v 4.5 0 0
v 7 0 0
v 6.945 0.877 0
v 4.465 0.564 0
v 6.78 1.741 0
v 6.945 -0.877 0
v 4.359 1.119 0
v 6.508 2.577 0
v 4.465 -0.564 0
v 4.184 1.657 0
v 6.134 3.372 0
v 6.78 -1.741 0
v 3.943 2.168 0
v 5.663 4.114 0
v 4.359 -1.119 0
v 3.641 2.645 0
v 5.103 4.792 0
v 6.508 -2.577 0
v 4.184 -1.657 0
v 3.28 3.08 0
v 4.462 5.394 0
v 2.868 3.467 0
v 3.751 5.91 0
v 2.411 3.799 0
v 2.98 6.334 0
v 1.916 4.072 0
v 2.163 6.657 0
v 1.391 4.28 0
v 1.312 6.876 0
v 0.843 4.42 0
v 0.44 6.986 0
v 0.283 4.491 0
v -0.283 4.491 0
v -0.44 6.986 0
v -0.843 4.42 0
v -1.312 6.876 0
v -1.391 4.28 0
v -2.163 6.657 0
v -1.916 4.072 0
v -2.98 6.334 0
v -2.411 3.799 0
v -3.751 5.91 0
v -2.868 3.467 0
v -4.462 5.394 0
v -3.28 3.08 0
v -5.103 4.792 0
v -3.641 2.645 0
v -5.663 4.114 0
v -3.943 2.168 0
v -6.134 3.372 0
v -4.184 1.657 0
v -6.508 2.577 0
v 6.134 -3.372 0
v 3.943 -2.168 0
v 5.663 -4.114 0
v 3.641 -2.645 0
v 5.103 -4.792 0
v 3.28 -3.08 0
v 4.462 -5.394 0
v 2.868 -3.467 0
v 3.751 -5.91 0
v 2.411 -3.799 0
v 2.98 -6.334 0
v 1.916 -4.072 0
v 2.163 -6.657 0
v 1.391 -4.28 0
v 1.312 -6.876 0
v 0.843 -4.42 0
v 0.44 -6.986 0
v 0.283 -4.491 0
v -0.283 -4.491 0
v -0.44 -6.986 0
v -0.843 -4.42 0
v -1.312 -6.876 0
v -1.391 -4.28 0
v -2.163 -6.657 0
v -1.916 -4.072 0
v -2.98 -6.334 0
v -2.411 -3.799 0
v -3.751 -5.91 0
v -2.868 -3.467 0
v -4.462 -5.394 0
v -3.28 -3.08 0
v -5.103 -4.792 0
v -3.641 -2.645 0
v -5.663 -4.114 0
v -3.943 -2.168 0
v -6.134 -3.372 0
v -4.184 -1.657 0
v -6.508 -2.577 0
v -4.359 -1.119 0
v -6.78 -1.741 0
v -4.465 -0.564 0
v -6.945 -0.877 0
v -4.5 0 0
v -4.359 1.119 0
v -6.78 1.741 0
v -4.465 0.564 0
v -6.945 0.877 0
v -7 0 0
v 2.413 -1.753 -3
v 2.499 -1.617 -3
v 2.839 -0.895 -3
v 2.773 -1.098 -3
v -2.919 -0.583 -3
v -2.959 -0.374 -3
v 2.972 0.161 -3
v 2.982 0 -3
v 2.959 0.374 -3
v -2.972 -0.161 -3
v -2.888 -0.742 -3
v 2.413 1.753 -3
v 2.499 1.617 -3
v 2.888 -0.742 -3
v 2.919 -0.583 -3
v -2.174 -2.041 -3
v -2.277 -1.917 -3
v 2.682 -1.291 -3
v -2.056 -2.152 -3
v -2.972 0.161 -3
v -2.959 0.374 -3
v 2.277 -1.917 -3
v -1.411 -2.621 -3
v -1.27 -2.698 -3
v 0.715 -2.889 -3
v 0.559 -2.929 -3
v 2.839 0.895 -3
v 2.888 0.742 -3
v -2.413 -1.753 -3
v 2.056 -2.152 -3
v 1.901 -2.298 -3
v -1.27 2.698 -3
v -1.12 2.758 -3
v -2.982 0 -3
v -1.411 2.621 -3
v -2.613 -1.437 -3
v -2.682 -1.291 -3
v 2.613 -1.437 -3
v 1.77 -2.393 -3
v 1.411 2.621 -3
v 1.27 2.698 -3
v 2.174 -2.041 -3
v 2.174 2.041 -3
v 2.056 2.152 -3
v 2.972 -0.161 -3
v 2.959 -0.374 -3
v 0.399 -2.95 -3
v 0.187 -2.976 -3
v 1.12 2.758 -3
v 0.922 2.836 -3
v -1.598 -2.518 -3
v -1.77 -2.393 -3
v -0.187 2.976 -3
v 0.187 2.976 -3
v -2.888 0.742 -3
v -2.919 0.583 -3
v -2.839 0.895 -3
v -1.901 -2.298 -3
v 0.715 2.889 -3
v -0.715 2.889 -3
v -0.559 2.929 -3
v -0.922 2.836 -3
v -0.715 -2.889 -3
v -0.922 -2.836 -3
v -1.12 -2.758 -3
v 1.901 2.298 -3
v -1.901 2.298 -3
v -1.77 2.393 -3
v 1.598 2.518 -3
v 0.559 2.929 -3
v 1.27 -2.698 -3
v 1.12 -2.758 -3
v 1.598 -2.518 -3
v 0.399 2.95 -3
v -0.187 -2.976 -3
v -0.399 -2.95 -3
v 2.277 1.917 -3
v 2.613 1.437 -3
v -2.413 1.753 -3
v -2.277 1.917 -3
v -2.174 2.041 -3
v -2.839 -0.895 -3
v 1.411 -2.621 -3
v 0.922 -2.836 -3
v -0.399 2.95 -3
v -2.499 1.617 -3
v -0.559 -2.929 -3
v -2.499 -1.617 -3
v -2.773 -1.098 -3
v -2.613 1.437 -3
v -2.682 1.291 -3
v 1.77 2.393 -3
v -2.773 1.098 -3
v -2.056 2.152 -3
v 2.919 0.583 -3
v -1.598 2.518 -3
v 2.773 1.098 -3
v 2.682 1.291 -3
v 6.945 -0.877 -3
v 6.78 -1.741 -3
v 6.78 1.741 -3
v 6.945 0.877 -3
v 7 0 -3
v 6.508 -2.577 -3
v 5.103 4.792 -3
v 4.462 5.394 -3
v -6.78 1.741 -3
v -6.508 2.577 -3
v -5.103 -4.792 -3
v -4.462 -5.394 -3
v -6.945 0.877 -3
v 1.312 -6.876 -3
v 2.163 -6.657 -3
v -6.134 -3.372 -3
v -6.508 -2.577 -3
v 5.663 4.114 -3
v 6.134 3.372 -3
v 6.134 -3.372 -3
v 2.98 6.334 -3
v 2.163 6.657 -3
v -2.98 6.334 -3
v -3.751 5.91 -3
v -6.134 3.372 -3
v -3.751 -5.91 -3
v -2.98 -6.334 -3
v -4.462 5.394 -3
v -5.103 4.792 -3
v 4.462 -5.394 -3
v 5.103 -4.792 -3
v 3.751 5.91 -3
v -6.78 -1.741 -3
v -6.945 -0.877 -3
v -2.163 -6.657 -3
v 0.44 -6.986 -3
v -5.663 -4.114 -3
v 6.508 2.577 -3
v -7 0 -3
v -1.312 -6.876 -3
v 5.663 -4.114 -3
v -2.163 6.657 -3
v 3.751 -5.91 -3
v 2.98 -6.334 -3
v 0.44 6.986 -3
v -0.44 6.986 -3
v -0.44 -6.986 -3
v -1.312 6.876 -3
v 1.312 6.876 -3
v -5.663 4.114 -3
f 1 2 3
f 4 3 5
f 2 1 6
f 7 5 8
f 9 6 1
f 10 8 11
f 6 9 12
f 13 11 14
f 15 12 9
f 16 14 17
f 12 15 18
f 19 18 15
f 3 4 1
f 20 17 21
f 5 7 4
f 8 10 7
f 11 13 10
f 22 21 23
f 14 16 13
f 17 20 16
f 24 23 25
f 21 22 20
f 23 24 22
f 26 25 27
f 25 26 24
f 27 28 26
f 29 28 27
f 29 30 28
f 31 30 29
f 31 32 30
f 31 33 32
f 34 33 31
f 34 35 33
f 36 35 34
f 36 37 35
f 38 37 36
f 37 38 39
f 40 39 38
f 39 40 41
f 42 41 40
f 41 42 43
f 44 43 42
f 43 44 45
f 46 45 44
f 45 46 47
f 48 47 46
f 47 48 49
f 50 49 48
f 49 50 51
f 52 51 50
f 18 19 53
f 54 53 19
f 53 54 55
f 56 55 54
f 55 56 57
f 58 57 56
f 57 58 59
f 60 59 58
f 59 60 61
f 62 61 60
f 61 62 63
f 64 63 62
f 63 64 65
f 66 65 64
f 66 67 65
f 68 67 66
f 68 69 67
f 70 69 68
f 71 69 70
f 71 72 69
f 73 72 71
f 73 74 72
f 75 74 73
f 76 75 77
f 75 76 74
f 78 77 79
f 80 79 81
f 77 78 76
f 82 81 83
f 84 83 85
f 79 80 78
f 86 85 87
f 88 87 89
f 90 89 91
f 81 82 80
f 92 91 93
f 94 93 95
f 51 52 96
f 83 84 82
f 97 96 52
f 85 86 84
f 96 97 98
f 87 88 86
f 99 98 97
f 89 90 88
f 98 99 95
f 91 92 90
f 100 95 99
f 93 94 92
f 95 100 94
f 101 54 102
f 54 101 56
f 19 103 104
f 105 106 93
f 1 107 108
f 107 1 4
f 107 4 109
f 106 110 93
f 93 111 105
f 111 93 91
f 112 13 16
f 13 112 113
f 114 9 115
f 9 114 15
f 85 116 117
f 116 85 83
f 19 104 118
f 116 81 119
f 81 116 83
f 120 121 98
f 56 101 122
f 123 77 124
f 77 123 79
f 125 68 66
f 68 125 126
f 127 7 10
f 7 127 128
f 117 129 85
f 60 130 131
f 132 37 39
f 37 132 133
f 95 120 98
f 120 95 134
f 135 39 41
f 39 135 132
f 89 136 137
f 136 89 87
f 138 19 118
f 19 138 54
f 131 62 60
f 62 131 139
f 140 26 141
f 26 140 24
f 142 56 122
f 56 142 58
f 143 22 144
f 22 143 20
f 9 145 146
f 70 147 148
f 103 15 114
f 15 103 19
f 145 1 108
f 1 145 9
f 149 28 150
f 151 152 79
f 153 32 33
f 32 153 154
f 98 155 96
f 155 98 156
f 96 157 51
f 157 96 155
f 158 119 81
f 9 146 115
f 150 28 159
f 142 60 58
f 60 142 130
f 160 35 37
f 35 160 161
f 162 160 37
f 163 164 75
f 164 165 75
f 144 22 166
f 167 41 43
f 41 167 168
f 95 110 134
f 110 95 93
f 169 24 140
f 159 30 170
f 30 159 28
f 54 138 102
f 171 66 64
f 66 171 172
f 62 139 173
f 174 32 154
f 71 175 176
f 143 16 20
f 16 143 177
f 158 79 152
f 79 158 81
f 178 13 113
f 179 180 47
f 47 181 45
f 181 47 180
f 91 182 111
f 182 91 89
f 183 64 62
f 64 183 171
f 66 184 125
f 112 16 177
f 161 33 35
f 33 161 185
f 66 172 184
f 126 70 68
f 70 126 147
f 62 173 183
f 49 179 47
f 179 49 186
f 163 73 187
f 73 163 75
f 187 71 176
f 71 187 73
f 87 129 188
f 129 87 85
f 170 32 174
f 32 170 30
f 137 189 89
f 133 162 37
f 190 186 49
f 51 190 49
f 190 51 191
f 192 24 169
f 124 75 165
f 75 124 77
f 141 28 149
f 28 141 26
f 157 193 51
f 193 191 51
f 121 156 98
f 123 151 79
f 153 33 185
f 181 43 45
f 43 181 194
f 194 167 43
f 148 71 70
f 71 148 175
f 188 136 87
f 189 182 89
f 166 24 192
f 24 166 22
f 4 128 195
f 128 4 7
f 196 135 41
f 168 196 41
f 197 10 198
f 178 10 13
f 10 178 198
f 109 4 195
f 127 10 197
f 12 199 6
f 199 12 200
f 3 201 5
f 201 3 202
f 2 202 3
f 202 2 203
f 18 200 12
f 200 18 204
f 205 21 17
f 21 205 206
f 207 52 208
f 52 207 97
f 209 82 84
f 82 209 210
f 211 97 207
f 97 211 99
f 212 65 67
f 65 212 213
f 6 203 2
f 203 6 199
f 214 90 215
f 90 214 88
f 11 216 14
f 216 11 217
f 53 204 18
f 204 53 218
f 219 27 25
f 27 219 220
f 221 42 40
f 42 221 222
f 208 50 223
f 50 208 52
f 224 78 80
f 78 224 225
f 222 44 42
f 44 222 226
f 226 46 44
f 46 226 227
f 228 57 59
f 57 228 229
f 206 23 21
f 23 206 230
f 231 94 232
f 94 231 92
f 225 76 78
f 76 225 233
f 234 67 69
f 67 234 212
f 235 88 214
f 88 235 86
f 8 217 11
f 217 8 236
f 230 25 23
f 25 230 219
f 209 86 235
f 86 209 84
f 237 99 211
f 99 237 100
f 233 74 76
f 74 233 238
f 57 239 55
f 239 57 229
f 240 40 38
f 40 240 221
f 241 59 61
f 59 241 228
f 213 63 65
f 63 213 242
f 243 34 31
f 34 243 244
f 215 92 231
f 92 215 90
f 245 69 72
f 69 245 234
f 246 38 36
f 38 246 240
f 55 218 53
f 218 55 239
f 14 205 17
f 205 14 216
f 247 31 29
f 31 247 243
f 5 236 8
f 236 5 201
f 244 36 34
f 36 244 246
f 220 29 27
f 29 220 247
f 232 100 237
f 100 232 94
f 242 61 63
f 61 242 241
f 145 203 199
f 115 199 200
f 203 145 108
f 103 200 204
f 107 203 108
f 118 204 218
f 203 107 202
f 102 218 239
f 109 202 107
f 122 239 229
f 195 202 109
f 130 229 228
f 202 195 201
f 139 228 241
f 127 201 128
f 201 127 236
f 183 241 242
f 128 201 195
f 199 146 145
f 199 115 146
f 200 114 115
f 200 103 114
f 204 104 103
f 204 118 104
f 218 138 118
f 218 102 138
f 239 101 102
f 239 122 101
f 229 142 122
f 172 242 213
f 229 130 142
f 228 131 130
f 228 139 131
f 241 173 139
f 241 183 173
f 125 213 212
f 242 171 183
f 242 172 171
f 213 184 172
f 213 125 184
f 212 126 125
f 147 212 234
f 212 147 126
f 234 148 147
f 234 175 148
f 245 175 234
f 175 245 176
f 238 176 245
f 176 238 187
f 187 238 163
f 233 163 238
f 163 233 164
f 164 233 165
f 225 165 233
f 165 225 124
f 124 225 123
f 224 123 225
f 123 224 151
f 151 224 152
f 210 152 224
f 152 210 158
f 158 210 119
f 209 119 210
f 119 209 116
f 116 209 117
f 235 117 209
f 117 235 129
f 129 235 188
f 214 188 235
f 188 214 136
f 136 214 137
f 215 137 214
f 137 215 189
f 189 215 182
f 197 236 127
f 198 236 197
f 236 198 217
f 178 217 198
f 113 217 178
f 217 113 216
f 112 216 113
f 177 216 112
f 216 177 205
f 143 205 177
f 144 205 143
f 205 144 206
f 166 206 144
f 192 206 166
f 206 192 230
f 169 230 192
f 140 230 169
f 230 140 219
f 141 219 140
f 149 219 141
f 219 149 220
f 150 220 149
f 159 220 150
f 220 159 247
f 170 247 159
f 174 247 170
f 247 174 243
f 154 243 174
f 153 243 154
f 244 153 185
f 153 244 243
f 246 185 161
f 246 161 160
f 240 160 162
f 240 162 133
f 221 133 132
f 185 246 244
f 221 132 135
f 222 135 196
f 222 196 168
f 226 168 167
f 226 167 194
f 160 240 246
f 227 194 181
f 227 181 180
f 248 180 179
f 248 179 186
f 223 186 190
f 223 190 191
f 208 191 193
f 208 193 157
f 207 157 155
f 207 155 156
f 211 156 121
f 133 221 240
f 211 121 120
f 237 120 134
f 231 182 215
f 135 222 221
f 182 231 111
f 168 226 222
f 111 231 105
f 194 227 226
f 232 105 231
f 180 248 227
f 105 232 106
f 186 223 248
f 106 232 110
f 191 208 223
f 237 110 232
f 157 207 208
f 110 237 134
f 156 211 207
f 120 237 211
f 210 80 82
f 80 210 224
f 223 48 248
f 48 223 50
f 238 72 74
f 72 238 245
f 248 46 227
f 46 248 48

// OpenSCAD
$fn = 50;


difference() {
	union() {
		translate(v = [0, 0, -3.0000000000]) {
			cylinder(h = 3, r = 7.0000000000);
		}
	}
	union() {
		translate(v = [0, 0, 0]) {
			rotate(a = [0, 0, 0]) {
				difference() {
					union() {
						#translate(v = [0, 0, -3.0000000000]) {
							cylinder(h = 3, r = 2.2500000000);
						}
						#translate(v = [0, 0, -4.2000000000]) {
							cylinder(h = 4.2000000000, r = 7.0000000000, r1 = 2.3750000000, r2 = 4.5000000000);
						}
						#translate(v = [0, 0, -3.0000000000]) {
							cylinder(h = 3, r = 2.3750000000);
						}
						#translate(v = [0, 0, -3.0000000000]) {
							cylinder(h = 3, r = 2.2500000000);
						}
					}
					union();
				}
			}
		}
	}
}
